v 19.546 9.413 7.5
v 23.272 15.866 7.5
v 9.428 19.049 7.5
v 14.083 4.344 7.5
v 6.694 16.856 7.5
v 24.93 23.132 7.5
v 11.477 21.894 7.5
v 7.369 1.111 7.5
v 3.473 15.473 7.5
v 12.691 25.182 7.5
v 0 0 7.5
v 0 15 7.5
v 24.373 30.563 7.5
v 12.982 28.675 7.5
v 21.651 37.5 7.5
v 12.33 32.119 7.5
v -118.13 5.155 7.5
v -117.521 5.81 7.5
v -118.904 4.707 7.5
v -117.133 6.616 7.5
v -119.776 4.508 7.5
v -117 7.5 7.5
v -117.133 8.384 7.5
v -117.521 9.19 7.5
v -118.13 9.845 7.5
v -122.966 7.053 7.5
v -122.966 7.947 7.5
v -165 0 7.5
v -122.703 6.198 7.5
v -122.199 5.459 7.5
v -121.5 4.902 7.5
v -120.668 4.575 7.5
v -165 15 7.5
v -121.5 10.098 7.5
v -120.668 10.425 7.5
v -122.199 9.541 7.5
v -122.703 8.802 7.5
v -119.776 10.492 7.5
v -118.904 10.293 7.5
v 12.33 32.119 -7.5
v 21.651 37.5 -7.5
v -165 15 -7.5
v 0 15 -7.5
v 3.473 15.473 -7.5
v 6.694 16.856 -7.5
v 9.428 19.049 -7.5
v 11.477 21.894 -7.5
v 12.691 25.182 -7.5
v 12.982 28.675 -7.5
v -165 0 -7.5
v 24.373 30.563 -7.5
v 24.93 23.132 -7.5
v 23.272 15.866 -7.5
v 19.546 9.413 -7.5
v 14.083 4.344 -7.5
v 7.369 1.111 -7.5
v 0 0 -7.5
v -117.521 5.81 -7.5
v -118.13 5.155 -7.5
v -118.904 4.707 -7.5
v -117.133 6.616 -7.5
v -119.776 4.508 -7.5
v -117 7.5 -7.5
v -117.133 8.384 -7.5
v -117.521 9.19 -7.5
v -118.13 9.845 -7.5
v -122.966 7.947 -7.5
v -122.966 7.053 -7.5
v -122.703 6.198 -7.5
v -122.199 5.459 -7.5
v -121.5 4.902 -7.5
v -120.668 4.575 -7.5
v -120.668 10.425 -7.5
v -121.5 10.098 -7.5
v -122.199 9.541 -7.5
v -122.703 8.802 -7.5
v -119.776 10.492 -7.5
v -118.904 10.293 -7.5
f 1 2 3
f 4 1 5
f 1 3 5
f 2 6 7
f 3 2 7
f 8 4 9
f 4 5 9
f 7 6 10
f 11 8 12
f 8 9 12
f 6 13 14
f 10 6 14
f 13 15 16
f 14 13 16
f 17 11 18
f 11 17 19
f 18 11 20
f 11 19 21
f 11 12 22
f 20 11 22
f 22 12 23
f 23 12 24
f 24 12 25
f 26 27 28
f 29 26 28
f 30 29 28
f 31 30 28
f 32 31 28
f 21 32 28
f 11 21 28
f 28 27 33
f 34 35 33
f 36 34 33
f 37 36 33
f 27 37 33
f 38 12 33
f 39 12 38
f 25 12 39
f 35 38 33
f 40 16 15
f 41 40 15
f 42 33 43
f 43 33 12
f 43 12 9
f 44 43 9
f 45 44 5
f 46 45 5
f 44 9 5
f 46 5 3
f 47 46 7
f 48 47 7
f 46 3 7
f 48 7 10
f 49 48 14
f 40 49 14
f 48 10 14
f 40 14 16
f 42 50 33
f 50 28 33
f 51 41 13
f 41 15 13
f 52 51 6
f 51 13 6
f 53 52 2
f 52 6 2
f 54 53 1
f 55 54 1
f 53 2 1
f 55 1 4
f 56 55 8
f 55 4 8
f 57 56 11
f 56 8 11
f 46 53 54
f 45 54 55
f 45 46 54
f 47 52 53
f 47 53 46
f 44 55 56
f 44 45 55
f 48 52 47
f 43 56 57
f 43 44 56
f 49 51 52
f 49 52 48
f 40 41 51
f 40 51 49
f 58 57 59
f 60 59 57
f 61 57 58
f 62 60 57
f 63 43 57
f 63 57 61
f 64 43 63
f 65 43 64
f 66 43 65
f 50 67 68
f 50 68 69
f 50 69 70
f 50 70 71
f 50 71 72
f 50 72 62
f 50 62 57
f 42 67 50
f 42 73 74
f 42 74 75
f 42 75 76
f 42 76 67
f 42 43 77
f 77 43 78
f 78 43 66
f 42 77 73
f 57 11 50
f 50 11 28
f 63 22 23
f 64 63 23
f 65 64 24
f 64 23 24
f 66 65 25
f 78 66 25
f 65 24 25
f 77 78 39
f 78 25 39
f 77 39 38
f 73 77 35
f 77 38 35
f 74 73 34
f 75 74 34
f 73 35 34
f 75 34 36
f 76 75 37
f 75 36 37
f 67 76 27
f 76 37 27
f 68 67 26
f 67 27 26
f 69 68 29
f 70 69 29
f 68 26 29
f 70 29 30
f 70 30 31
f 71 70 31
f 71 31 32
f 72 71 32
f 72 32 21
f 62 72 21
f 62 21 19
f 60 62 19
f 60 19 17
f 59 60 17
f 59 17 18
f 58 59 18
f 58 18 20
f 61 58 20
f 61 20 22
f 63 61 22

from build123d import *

# Parameters (mm, degrees)
SALIENTE_EXTRUIR1_DEPTH = 7.5
CROQUIS2_R              = 3
CORTAR_EXTRUIR1_DEPTH   = 170.871274794


with BuildPart() as part:
    # Croquis1 → Saliente-Extruir1 (new, symmetric)
    with BuildSketch(Plane.XY):
        with BuildLine():
            Line((12.330243842, 32.118869601), (21.650635095, 37.5))
            ThreePointArc((21.650635095, 37.5), (21.650635095, 12.5), (0, 0))
            Line((0, 0), (-165, 0))
            Line((-165, 0), (-165, 15))
            Line((-165, 15), (0, 15))
            ThreePointArc((0, 15), (10.548585327, 20.402148489), (12.330243842, 32.118869601))
        make_face()
    extrude(amount=SALIENTE_EXTRUIR1_DEPTH, both=True)

    # Croquis2 → Cortar-Extruir1 (cut, through all)
    with BuildSketch(Plane.XY.offset(7.5)):
        with Locations((-120, 7.5)):
            Circle(CROQUIS2_R)
    extrude(amount=-CORTAR_EXTRUIR1_DEPTH, mode=Mode.SUBTRACT)


solid = part.part
